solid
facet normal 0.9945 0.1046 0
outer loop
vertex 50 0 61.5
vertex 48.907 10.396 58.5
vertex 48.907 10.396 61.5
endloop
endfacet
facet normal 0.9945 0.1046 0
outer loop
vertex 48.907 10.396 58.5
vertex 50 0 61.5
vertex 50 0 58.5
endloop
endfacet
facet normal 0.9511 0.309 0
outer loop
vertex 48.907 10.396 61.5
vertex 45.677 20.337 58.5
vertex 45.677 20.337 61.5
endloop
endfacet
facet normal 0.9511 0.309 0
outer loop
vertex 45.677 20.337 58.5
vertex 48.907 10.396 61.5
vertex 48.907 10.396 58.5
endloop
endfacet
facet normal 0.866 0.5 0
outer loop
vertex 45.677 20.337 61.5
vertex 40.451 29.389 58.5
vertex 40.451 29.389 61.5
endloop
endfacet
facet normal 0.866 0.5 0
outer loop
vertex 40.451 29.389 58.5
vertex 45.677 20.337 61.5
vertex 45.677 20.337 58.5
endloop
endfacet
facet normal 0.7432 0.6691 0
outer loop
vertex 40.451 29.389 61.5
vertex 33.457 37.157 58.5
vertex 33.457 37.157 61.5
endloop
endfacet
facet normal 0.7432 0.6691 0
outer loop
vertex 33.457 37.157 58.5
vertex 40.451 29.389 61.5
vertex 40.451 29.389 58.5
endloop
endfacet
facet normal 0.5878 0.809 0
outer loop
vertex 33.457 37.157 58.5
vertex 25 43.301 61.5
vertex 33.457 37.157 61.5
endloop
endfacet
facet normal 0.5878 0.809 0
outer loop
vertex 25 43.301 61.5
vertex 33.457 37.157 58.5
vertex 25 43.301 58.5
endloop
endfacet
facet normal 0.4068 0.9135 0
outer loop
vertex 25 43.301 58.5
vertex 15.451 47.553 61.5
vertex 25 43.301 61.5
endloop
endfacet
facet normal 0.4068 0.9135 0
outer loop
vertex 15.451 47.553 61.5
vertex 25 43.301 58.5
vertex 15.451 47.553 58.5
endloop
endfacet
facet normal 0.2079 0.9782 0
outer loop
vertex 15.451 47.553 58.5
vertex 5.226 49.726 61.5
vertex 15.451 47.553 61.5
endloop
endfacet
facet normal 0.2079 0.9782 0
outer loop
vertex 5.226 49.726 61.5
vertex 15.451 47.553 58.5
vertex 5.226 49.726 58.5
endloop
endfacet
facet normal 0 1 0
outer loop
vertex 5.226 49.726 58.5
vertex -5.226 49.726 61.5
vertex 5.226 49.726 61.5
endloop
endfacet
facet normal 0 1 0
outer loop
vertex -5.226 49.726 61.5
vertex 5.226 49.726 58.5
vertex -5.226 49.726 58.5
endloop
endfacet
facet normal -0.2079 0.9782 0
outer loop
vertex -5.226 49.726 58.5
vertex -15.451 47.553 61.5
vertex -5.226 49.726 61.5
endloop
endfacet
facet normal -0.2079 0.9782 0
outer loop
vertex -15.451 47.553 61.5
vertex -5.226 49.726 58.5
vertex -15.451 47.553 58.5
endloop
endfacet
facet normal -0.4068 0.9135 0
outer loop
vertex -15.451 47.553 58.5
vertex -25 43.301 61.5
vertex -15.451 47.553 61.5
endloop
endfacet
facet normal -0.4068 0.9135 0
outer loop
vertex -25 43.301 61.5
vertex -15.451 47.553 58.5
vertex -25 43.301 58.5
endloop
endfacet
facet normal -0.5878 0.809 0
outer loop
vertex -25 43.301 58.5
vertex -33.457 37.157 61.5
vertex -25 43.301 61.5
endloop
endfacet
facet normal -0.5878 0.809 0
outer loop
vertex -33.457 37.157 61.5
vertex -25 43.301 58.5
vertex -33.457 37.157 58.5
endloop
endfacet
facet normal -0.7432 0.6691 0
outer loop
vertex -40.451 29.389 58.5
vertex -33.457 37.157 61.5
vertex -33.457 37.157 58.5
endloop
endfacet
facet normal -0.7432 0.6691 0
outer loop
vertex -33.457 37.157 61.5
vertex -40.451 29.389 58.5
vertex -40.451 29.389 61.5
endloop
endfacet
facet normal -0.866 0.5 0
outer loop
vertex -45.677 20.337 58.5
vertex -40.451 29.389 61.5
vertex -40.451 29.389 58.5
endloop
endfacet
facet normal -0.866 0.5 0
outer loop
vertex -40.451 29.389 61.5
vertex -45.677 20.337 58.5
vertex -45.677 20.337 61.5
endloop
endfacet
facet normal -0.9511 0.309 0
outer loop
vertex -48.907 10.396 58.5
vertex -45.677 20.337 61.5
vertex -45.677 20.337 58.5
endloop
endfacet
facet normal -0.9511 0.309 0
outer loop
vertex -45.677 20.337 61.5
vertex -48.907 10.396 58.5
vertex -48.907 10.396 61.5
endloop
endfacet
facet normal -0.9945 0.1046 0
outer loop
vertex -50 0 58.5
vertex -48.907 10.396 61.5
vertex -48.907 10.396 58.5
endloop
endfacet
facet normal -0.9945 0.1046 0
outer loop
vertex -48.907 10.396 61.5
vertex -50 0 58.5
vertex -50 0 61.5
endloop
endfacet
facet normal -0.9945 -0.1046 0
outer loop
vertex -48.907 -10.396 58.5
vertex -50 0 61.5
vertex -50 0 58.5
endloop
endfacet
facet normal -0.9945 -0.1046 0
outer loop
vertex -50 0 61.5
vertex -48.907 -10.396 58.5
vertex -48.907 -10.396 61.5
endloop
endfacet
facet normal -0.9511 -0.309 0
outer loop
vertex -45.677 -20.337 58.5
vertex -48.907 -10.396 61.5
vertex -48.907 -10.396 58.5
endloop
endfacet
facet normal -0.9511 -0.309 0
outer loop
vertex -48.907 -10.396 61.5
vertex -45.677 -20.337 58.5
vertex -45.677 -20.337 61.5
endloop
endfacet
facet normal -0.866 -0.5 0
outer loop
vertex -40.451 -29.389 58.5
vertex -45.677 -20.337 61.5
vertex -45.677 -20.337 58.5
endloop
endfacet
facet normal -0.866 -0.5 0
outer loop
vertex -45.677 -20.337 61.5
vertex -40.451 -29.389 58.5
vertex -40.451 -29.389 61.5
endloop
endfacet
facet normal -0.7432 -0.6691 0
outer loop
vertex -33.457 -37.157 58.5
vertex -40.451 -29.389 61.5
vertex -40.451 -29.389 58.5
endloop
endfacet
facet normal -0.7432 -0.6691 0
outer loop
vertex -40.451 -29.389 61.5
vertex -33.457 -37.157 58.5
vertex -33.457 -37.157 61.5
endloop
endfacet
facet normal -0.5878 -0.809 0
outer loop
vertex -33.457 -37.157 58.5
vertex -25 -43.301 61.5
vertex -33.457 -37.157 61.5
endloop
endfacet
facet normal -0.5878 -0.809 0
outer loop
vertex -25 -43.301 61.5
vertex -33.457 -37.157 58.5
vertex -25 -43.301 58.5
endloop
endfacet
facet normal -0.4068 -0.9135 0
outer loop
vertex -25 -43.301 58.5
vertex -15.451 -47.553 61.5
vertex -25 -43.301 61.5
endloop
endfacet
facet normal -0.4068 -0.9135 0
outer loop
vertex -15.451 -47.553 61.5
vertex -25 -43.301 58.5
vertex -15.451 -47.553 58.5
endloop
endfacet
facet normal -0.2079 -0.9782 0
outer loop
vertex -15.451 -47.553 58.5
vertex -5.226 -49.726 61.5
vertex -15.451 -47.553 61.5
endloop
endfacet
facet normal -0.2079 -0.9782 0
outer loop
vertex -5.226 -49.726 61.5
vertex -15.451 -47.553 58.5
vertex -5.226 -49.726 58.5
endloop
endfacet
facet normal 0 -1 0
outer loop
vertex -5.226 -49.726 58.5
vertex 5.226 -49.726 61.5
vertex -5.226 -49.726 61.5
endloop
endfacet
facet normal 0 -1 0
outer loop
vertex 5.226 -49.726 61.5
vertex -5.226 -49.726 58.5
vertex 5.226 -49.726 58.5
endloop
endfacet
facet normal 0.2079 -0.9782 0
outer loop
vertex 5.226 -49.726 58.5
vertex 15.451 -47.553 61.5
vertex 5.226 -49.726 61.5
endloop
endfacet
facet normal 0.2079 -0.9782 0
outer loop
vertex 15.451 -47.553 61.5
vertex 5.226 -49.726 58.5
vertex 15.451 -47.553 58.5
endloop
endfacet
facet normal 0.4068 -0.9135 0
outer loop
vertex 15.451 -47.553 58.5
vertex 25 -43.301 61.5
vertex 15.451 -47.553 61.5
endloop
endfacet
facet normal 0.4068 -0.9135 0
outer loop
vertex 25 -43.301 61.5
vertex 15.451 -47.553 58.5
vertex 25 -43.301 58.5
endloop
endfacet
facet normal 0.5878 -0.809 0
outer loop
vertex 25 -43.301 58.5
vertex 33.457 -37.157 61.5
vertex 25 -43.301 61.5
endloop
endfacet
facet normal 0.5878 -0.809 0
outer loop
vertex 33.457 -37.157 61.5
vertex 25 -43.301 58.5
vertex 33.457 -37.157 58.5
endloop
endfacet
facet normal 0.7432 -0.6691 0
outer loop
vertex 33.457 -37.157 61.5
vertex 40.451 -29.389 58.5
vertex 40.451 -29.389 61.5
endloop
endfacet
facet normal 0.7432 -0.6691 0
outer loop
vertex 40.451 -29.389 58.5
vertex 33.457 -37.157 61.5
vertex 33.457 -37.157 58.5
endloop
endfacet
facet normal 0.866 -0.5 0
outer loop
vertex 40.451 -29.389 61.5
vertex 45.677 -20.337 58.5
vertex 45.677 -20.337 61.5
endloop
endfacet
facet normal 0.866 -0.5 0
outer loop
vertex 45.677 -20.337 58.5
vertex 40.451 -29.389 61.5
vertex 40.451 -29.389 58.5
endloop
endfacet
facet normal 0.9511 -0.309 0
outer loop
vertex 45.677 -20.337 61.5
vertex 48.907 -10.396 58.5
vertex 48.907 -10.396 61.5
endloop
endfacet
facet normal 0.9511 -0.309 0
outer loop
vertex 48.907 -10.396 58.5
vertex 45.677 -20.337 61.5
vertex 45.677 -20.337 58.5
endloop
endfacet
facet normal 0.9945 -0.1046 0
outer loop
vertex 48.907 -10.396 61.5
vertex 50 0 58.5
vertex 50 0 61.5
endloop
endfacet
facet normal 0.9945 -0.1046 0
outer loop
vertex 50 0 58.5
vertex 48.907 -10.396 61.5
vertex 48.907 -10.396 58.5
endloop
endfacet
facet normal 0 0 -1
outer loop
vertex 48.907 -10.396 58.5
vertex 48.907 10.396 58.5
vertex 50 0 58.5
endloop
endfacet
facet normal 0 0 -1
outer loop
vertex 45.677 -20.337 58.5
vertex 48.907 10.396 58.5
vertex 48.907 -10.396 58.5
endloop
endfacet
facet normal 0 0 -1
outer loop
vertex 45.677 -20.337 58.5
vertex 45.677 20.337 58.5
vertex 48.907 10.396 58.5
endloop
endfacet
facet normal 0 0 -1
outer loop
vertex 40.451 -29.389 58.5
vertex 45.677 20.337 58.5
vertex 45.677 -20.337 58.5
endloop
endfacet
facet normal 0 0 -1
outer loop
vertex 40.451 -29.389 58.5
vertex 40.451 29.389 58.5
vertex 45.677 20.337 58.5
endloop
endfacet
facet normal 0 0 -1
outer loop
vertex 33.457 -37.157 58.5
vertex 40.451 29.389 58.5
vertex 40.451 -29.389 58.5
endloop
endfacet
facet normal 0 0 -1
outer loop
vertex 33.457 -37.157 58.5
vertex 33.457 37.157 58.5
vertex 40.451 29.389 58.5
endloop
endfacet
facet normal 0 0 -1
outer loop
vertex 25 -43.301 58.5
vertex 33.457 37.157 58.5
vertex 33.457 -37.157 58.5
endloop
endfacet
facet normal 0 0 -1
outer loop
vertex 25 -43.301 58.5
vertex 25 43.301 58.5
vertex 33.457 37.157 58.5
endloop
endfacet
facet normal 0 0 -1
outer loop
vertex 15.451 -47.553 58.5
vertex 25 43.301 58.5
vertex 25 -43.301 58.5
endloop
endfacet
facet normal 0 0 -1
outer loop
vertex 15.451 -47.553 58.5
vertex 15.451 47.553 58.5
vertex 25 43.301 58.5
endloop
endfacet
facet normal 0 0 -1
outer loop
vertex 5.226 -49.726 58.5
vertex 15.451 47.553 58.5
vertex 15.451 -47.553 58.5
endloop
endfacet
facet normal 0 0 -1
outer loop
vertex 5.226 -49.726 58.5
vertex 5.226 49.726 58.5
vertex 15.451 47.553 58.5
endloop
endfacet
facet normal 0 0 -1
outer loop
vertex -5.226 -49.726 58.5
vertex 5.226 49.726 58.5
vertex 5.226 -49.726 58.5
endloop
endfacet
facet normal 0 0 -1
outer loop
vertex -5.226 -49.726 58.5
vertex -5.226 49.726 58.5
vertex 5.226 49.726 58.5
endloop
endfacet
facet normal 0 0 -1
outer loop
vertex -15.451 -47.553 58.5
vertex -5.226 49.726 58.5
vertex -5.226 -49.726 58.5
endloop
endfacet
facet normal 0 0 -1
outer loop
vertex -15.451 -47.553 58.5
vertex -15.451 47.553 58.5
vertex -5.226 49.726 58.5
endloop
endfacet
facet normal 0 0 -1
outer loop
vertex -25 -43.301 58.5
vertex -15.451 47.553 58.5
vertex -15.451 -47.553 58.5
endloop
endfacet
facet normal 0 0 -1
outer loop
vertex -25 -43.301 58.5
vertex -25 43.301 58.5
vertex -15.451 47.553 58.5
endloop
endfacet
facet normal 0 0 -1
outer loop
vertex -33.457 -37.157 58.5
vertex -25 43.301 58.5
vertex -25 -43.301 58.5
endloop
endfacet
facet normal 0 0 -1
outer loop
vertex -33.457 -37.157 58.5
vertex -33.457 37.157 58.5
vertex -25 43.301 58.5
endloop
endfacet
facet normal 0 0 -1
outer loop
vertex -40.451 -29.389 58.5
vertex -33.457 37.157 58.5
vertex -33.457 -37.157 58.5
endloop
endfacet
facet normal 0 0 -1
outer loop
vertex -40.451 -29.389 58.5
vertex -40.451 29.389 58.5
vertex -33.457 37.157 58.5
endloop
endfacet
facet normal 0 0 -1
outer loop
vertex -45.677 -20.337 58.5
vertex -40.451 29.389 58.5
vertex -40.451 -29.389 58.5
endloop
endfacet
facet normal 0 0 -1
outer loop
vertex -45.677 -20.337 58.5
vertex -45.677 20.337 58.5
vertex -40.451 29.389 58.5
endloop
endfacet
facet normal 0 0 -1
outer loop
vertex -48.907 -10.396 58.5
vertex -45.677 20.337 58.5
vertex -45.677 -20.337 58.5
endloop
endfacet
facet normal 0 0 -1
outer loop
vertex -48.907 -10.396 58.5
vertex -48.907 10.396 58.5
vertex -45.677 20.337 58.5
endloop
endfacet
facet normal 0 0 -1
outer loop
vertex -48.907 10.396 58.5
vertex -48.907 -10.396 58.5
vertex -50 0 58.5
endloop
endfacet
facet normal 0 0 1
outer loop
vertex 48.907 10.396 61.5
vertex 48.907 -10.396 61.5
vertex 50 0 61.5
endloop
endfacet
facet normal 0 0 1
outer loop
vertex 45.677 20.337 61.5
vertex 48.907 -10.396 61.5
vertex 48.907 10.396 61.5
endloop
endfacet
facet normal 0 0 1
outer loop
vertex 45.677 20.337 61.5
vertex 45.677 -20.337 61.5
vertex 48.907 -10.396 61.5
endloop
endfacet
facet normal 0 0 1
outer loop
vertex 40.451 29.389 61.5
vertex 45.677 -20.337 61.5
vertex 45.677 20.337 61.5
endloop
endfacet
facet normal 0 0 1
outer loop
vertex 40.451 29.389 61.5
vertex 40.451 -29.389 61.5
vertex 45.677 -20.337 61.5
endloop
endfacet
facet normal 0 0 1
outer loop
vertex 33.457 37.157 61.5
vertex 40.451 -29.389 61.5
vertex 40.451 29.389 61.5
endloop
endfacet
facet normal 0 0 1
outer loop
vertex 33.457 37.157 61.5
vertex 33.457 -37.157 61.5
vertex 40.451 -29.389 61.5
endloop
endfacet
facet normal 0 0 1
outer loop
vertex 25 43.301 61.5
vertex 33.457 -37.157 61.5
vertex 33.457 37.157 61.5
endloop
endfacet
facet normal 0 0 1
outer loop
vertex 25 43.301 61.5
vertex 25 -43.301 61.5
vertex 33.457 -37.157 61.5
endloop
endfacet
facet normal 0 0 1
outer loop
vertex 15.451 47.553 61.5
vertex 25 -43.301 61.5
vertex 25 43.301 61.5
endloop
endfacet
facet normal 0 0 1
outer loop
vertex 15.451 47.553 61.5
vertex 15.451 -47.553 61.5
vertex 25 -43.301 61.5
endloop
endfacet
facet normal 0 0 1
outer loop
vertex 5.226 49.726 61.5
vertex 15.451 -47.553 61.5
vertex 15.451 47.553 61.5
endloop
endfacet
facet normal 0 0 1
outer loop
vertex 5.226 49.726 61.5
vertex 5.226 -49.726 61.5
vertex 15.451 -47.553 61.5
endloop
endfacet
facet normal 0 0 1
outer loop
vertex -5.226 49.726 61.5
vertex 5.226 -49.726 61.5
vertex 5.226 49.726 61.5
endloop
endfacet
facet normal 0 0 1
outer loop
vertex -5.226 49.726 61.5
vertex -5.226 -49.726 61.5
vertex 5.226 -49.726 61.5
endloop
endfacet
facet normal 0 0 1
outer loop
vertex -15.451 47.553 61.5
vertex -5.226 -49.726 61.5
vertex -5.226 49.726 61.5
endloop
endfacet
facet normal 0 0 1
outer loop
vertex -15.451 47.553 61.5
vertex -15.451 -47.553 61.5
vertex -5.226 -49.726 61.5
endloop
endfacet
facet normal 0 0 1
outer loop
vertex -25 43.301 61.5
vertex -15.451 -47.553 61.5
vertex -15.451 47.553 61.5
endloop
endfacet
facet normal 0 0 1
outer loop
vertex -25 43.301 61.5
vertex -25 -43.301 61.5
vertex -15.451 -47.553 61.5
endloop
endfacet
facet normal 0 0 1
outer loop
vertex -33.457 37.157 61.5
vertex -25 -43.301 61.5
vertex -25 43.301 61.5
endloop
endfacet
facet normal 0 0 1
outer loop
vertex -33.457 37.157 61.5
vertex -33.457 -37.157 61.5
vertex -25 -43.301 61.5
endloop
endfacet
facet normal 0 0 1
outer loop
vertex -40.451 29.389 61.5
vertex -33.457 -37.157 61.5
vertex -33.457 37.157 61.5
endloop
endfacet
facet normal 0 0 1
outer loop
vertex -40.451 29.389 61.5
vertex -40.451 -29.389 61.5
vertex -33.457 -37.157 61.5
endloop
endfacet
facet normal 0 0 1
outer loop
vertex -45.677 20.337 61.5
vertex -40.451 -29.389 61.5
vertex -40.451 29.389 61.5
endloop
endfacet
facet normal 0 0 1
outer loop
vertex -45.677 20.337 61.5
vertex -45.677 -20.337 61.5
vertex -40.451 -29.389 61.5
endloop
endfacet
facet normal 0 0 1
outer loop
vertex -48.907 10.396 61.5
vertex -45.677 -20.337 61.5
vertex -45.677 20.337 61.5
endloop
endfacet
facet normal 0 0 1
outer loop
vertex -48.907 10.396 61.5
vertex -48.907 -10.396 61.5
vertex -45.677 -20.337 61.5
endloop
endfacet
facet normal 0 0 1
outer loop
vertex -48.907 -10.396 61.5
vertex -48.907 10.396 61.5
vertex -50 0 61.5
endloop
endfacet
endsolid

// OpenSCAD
color("white"){
	translate([0,0,60]){
		cylinder(d=100,h=3, center=true);
	}
}
